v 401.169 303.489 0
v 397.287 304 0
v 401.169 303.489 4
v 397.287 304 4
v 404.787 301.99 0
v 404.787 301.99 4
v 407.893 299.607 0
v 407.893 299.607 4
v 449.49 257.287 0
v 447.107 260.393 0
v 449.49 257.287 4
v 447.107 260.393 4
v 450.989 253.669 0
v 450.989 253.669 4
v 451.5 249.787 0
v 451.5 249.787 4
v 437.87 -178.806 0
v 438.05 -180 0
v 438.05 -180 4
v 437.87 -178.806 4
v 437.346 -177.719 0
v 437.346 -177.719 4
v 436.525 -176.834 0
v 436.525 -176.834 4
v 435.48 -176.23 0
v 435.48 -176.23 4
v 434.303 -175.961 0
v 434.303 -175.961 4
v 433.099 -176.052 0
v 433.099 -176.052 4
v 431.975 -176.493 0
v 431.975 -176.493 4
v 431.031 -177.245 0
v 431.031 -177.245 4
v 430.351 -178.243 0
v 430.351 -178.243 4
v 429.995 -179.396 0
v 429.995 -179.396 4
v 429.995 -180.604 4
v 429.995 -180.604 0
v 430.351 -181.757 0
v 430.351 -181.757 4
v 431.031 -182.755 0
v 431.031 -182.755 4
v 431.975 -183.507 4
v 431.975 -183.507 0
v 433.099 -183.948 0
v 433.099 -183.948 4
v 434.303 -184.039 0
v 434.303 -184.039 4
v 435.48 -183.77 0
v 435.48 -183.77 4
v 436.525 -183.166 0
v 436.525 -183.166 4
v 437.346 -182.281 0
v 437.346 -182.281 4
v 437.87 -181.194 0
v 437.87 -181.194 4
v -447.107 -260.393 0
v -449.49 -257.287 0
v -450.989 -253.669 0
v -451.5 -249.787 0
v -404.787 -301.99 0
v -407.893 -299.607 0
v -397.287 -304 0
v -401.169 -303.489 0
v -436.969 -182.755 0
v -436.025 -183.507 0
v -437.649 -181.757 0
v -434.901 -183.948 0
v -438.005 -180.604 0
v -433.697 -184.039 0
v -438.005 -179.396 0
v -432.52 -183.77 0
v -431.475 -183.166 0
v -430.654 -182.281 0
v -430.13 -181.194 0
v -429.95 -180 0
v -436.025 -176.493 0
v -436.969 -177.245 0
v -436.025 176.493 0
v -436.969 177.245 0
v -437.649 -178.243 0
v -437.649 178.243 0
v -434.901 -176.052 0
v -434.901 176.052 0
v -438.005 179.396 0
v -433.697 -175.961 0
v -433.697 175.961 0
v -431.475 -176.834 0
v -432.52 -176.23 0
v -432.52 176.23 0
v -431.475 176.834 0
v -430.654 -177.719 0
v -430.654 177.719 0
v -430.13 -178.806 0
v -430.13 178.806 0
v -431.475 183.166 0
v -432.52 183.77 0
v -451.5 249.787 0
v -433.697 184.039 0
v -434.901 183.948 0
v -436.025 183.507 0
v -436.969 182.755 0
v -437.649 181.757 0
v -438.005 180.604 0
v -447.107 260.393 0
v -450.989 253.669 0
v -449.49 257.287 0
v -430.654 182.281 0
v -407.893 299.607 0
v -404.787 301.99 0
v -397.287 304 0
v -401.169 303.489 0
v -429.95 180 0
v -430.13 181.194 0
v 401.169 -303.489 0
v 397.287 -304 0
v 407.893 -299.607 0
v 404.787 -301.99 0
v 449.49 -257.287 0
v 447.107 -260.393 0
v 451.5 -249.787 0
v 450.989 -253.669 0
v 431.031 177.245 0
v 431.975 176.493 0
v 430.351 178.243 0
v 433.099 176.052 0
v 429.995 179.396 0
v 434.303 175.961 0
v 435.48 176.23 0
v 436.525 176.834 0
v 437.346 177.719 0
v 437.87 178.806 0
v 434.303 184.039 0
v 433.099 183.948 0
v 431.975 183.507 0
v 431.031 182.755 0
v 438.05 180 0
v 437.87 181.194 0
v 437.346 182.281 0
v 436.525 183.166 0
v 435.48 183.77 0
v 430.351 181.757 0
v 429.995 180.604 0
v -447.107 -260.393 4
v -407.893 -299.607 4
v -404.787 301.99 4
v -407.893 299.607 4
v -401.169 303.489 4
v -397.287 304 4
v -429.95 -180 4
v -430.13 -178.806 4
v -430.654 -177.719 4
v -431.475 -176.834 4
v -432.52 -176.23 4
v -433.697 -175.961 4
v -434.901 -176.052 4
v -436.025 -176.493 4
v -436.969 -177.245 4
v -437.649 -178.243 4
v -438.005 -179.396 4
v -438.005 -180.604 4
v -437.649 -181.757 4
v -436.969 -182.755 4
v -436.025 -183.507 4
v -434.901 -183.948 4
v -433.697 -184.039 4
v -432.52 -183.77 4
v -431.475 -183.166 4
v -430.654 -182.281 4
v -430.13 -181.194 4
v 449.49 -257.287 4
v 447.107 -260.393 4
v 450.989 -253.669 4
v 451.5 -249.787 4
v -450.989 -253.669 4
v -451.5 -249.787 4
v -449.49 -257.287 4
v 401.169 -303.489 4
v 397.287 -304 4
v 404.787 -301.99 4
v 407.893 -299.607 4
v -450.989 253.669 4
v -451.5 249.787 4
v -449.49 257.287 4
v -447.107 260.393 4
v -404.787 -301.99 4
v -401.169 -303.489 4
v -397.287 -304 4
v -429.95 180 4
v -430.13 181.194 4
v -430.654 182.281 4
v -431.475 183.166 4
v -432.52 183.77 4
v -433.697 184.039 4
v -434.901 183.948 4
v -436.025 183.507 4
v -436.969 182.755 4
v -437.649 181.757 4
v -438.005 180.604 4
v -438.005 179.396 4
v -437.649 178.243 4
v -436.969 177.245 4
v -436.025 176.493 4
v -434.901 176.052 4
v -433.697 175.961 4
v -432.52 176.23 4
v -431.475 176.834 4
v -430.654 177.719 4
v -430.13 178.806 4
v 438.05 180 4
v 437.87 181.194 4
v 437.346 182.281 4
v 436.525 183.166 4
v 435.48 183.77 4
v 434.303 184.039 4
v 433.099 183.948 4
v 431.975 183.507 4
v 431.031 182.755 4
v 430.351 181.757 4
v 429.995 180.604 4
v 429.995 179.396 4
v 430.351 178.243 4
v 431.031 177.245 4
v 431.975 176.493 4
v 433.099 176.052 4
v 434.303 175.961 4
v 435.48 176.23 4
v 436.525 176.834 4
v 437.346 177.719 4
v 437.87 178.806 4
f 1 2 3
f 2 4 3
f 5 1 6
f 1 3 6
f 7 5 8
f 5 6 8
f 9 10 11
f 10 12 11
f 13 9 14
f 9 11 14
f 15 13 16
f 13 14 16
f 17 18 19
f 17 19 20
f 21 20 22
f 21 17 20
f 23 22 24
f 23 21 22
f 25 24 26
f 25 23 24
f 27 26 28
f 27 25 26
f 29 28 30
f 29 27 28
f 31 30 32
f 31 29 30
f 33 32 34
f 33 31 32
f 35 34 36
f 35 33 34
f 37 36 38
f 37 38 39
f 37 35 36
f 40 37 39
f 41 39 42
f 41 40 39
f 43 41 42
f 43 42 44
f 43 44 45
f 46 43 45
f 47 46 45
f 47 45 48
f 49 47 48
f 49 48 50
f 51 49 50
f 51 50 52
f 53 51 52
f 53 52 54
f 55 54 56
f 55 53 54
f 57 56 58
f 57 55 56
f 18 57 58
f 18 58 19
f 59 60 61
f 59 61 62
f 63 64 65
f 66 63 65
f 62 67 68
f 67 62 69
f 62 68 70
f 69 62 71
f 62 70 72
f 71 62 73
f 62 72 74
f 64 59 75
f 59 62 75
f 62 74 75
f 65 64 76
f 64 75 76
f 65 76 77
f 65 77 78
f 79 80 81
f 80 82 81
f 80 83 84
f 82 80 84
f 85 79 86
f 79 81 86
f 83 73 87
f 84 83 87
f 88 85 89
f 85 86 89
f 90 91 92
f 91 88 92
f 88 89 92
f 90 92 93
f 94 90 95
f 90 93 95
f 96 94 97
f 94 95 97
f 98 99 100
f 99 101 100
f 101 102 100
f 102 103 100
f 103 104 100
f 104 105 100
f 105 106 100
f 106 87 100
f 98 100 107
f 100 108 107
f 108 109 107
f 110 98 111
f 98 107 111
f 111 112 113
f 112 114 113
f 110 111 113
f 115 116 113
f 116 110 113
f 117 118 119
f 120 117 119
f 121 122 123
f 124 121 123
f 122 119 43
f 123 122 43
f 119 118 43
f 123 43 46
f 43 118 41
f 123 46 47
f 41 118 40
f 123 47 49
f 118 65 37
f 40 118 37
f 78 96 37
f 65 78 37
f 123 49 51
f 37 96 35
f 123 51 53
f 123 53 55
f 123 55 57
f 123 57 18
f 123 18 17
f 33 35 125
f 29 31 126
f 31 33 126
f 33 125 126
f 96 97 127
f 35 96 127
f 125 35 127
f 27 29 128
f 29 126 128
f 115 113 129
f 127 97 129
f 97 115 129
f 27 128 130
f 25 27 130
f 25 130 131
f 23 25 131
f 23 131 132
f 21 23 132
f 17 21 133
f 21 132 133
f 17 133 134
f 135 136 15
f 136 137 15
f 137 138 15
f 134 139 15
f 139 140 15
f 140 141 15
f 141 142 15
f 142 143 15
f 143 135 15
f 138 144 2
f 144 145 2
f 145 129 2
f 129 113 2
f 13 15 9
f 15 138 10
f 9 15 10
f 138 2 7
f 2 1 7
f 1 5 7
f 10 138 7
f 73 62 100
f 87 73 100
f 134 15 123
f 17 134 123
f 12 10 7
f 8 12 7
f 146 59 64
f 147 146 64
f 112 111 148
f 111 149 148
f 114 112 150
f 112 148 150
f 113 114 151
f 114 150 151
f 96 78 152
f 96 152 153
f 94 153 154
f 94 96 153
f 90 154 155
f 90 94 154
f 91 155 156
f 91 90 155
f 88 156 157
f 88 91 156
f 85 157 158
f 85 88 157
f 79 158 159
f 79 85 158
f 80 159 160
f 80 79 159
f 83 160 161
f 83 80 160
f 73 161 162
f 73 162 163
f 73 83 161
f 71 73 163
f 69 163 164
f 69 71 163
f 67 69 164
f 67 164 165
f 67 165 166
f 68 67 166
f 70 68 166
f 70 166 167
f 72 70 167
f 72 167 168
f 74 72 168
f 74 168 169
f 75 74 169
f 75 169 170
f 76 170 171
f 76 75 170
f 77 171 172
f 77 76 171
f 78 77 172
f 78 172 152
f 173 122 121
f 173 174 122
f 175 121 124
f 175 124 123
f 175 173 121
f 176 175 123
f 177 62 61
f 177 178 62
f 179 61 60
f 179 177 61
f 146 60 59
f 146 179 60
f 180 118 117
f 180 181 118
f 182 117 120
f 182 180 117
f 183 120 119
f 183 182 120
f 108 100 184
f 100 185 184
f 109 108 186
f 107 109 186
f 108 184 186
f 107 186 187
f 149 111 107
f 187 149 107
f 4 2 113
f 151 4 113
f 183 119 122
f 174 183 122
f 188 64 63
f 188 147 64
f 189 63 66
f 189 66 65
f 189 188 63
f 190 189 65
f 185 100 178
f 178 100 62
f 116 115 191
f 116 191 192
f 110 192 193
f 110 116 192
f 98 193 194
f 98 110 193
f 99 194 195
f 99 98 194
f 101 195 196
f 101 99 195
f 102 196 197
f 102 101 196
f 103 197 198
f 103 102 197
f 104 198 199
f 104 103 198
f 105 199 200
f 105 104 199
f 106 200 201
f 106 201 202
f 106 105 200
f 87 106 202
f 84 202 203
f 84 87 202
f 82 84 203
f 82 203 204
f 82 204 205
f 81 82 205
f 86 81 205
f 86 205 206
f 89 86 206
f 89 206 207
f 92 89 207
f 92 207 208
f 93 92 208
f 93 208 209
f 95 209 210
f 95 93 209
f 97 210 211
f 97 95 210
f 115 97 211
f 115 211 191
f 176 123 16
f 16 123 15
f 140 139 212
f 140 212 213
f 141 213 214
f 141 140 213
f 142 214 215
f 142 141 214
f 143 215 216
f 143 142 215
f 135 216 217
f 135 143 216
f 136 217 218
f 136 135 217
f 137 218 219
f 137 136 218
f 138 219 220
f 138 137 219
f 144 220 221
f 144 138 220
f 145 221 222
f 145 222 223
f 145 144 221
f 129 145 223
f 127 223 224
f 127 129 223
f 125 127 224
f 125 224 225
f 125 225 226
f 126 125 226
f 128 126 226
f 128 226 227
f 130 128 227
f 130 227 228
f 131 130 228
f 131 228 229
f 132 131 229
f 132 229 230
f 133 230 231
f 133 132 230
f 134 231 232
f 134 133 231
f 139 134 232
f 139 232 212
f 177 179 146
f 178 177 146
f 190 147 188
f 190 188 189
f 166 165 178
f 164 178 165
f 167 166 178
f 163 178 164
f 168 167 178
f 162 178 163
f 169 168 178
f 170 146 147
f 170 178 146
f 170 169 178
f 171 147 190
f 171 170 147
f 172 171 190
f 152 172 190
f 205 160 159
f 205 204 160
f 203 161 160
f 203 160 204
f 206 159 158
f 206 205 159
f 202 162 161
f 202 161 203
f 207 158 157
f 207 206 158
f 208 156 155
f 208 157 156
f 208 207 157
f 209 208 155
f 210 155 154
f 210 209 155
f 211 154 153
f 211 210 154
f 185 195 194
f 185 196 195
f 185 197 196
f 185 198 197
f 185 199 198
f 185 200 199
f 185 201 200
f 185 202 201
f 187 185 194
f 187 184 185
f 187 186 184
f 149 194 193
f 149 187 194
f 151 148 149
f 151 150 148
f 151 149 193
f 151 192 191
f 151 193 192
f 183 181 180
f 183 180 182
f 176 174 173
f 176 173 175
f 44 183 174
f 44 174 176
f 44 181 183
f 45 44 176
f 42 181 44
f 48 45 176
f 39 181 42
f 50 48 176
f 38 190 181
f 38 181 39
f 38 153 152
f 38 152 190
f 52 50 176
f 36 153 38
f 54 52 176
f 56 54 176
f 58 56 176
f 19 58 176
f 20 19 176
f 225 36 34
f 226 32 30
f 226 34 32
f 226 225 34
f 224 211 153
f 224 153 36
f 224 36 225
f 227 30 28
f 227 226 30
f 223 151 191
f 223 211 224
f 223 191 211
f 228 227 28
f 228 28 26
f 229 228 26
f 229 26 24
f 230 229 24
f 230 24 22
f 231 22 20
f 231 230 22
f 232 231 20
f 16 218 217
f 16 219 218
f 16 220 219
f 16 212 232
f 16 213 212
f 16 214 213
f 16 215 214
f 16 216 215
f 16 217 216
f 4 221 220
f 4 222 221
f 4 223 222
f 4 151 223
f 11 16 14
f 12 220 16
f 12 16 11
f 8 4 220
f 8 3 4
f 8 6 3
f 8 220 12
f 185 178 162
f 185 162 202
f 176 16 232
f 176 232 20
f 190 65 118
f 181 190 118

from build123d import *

# Parameters (mm, degrees)
SKETCH2_R           = 4.05
BOSS_EXTRUDE1_DEPTH = 4
FILLET1_R           = 15


with BuildPart() as part:
    # Sketch2 → Boss-Extrude1 (new body)
    with BuildSketch(Plane.XY):
        Polygon((-451.5, 256), (-451.5, -256), (-403.5, -304), (403.5, -304), (451.5, -256), (451.5, 256), (403.5, 304), (-403.5, 304), align=None)
        with Locations((-434, 180)):
            Circle(SKETCH2_R, mode=Mode.SUBTRACT)
        with Locations((-434, -180)):
            Circle(SKETCH2_R, mode=Mode.SUBTRACT)
        with Locations((434, -180)):
            Circle(SKETCH2_R, mode=Mode.SUBTRACT)
        with Locations((434, 180)):
            Circle(SKETCH2_R, mode=Mode.SUBTRACT)
    extrude(amount=BOSS_EXTRUDE1_DEPTH)

    # Fillet1
    fillet1_edges = [part.edges().sort_by_distance(p)[0] for p in [
        (-451.5, -256, 2),
        (-451.5, 256, 2),
        (-403.5, 304, 2),
        (403.5, 304, 2),
        (451.5, 256, 2),
        (451.5, -256, 2),
        (403.5, -304, 2),
        (-403.5, -304, 2),
    ]]
    fillet(fillet1_edges, radius=FILLET1_R)


solid = part.part
